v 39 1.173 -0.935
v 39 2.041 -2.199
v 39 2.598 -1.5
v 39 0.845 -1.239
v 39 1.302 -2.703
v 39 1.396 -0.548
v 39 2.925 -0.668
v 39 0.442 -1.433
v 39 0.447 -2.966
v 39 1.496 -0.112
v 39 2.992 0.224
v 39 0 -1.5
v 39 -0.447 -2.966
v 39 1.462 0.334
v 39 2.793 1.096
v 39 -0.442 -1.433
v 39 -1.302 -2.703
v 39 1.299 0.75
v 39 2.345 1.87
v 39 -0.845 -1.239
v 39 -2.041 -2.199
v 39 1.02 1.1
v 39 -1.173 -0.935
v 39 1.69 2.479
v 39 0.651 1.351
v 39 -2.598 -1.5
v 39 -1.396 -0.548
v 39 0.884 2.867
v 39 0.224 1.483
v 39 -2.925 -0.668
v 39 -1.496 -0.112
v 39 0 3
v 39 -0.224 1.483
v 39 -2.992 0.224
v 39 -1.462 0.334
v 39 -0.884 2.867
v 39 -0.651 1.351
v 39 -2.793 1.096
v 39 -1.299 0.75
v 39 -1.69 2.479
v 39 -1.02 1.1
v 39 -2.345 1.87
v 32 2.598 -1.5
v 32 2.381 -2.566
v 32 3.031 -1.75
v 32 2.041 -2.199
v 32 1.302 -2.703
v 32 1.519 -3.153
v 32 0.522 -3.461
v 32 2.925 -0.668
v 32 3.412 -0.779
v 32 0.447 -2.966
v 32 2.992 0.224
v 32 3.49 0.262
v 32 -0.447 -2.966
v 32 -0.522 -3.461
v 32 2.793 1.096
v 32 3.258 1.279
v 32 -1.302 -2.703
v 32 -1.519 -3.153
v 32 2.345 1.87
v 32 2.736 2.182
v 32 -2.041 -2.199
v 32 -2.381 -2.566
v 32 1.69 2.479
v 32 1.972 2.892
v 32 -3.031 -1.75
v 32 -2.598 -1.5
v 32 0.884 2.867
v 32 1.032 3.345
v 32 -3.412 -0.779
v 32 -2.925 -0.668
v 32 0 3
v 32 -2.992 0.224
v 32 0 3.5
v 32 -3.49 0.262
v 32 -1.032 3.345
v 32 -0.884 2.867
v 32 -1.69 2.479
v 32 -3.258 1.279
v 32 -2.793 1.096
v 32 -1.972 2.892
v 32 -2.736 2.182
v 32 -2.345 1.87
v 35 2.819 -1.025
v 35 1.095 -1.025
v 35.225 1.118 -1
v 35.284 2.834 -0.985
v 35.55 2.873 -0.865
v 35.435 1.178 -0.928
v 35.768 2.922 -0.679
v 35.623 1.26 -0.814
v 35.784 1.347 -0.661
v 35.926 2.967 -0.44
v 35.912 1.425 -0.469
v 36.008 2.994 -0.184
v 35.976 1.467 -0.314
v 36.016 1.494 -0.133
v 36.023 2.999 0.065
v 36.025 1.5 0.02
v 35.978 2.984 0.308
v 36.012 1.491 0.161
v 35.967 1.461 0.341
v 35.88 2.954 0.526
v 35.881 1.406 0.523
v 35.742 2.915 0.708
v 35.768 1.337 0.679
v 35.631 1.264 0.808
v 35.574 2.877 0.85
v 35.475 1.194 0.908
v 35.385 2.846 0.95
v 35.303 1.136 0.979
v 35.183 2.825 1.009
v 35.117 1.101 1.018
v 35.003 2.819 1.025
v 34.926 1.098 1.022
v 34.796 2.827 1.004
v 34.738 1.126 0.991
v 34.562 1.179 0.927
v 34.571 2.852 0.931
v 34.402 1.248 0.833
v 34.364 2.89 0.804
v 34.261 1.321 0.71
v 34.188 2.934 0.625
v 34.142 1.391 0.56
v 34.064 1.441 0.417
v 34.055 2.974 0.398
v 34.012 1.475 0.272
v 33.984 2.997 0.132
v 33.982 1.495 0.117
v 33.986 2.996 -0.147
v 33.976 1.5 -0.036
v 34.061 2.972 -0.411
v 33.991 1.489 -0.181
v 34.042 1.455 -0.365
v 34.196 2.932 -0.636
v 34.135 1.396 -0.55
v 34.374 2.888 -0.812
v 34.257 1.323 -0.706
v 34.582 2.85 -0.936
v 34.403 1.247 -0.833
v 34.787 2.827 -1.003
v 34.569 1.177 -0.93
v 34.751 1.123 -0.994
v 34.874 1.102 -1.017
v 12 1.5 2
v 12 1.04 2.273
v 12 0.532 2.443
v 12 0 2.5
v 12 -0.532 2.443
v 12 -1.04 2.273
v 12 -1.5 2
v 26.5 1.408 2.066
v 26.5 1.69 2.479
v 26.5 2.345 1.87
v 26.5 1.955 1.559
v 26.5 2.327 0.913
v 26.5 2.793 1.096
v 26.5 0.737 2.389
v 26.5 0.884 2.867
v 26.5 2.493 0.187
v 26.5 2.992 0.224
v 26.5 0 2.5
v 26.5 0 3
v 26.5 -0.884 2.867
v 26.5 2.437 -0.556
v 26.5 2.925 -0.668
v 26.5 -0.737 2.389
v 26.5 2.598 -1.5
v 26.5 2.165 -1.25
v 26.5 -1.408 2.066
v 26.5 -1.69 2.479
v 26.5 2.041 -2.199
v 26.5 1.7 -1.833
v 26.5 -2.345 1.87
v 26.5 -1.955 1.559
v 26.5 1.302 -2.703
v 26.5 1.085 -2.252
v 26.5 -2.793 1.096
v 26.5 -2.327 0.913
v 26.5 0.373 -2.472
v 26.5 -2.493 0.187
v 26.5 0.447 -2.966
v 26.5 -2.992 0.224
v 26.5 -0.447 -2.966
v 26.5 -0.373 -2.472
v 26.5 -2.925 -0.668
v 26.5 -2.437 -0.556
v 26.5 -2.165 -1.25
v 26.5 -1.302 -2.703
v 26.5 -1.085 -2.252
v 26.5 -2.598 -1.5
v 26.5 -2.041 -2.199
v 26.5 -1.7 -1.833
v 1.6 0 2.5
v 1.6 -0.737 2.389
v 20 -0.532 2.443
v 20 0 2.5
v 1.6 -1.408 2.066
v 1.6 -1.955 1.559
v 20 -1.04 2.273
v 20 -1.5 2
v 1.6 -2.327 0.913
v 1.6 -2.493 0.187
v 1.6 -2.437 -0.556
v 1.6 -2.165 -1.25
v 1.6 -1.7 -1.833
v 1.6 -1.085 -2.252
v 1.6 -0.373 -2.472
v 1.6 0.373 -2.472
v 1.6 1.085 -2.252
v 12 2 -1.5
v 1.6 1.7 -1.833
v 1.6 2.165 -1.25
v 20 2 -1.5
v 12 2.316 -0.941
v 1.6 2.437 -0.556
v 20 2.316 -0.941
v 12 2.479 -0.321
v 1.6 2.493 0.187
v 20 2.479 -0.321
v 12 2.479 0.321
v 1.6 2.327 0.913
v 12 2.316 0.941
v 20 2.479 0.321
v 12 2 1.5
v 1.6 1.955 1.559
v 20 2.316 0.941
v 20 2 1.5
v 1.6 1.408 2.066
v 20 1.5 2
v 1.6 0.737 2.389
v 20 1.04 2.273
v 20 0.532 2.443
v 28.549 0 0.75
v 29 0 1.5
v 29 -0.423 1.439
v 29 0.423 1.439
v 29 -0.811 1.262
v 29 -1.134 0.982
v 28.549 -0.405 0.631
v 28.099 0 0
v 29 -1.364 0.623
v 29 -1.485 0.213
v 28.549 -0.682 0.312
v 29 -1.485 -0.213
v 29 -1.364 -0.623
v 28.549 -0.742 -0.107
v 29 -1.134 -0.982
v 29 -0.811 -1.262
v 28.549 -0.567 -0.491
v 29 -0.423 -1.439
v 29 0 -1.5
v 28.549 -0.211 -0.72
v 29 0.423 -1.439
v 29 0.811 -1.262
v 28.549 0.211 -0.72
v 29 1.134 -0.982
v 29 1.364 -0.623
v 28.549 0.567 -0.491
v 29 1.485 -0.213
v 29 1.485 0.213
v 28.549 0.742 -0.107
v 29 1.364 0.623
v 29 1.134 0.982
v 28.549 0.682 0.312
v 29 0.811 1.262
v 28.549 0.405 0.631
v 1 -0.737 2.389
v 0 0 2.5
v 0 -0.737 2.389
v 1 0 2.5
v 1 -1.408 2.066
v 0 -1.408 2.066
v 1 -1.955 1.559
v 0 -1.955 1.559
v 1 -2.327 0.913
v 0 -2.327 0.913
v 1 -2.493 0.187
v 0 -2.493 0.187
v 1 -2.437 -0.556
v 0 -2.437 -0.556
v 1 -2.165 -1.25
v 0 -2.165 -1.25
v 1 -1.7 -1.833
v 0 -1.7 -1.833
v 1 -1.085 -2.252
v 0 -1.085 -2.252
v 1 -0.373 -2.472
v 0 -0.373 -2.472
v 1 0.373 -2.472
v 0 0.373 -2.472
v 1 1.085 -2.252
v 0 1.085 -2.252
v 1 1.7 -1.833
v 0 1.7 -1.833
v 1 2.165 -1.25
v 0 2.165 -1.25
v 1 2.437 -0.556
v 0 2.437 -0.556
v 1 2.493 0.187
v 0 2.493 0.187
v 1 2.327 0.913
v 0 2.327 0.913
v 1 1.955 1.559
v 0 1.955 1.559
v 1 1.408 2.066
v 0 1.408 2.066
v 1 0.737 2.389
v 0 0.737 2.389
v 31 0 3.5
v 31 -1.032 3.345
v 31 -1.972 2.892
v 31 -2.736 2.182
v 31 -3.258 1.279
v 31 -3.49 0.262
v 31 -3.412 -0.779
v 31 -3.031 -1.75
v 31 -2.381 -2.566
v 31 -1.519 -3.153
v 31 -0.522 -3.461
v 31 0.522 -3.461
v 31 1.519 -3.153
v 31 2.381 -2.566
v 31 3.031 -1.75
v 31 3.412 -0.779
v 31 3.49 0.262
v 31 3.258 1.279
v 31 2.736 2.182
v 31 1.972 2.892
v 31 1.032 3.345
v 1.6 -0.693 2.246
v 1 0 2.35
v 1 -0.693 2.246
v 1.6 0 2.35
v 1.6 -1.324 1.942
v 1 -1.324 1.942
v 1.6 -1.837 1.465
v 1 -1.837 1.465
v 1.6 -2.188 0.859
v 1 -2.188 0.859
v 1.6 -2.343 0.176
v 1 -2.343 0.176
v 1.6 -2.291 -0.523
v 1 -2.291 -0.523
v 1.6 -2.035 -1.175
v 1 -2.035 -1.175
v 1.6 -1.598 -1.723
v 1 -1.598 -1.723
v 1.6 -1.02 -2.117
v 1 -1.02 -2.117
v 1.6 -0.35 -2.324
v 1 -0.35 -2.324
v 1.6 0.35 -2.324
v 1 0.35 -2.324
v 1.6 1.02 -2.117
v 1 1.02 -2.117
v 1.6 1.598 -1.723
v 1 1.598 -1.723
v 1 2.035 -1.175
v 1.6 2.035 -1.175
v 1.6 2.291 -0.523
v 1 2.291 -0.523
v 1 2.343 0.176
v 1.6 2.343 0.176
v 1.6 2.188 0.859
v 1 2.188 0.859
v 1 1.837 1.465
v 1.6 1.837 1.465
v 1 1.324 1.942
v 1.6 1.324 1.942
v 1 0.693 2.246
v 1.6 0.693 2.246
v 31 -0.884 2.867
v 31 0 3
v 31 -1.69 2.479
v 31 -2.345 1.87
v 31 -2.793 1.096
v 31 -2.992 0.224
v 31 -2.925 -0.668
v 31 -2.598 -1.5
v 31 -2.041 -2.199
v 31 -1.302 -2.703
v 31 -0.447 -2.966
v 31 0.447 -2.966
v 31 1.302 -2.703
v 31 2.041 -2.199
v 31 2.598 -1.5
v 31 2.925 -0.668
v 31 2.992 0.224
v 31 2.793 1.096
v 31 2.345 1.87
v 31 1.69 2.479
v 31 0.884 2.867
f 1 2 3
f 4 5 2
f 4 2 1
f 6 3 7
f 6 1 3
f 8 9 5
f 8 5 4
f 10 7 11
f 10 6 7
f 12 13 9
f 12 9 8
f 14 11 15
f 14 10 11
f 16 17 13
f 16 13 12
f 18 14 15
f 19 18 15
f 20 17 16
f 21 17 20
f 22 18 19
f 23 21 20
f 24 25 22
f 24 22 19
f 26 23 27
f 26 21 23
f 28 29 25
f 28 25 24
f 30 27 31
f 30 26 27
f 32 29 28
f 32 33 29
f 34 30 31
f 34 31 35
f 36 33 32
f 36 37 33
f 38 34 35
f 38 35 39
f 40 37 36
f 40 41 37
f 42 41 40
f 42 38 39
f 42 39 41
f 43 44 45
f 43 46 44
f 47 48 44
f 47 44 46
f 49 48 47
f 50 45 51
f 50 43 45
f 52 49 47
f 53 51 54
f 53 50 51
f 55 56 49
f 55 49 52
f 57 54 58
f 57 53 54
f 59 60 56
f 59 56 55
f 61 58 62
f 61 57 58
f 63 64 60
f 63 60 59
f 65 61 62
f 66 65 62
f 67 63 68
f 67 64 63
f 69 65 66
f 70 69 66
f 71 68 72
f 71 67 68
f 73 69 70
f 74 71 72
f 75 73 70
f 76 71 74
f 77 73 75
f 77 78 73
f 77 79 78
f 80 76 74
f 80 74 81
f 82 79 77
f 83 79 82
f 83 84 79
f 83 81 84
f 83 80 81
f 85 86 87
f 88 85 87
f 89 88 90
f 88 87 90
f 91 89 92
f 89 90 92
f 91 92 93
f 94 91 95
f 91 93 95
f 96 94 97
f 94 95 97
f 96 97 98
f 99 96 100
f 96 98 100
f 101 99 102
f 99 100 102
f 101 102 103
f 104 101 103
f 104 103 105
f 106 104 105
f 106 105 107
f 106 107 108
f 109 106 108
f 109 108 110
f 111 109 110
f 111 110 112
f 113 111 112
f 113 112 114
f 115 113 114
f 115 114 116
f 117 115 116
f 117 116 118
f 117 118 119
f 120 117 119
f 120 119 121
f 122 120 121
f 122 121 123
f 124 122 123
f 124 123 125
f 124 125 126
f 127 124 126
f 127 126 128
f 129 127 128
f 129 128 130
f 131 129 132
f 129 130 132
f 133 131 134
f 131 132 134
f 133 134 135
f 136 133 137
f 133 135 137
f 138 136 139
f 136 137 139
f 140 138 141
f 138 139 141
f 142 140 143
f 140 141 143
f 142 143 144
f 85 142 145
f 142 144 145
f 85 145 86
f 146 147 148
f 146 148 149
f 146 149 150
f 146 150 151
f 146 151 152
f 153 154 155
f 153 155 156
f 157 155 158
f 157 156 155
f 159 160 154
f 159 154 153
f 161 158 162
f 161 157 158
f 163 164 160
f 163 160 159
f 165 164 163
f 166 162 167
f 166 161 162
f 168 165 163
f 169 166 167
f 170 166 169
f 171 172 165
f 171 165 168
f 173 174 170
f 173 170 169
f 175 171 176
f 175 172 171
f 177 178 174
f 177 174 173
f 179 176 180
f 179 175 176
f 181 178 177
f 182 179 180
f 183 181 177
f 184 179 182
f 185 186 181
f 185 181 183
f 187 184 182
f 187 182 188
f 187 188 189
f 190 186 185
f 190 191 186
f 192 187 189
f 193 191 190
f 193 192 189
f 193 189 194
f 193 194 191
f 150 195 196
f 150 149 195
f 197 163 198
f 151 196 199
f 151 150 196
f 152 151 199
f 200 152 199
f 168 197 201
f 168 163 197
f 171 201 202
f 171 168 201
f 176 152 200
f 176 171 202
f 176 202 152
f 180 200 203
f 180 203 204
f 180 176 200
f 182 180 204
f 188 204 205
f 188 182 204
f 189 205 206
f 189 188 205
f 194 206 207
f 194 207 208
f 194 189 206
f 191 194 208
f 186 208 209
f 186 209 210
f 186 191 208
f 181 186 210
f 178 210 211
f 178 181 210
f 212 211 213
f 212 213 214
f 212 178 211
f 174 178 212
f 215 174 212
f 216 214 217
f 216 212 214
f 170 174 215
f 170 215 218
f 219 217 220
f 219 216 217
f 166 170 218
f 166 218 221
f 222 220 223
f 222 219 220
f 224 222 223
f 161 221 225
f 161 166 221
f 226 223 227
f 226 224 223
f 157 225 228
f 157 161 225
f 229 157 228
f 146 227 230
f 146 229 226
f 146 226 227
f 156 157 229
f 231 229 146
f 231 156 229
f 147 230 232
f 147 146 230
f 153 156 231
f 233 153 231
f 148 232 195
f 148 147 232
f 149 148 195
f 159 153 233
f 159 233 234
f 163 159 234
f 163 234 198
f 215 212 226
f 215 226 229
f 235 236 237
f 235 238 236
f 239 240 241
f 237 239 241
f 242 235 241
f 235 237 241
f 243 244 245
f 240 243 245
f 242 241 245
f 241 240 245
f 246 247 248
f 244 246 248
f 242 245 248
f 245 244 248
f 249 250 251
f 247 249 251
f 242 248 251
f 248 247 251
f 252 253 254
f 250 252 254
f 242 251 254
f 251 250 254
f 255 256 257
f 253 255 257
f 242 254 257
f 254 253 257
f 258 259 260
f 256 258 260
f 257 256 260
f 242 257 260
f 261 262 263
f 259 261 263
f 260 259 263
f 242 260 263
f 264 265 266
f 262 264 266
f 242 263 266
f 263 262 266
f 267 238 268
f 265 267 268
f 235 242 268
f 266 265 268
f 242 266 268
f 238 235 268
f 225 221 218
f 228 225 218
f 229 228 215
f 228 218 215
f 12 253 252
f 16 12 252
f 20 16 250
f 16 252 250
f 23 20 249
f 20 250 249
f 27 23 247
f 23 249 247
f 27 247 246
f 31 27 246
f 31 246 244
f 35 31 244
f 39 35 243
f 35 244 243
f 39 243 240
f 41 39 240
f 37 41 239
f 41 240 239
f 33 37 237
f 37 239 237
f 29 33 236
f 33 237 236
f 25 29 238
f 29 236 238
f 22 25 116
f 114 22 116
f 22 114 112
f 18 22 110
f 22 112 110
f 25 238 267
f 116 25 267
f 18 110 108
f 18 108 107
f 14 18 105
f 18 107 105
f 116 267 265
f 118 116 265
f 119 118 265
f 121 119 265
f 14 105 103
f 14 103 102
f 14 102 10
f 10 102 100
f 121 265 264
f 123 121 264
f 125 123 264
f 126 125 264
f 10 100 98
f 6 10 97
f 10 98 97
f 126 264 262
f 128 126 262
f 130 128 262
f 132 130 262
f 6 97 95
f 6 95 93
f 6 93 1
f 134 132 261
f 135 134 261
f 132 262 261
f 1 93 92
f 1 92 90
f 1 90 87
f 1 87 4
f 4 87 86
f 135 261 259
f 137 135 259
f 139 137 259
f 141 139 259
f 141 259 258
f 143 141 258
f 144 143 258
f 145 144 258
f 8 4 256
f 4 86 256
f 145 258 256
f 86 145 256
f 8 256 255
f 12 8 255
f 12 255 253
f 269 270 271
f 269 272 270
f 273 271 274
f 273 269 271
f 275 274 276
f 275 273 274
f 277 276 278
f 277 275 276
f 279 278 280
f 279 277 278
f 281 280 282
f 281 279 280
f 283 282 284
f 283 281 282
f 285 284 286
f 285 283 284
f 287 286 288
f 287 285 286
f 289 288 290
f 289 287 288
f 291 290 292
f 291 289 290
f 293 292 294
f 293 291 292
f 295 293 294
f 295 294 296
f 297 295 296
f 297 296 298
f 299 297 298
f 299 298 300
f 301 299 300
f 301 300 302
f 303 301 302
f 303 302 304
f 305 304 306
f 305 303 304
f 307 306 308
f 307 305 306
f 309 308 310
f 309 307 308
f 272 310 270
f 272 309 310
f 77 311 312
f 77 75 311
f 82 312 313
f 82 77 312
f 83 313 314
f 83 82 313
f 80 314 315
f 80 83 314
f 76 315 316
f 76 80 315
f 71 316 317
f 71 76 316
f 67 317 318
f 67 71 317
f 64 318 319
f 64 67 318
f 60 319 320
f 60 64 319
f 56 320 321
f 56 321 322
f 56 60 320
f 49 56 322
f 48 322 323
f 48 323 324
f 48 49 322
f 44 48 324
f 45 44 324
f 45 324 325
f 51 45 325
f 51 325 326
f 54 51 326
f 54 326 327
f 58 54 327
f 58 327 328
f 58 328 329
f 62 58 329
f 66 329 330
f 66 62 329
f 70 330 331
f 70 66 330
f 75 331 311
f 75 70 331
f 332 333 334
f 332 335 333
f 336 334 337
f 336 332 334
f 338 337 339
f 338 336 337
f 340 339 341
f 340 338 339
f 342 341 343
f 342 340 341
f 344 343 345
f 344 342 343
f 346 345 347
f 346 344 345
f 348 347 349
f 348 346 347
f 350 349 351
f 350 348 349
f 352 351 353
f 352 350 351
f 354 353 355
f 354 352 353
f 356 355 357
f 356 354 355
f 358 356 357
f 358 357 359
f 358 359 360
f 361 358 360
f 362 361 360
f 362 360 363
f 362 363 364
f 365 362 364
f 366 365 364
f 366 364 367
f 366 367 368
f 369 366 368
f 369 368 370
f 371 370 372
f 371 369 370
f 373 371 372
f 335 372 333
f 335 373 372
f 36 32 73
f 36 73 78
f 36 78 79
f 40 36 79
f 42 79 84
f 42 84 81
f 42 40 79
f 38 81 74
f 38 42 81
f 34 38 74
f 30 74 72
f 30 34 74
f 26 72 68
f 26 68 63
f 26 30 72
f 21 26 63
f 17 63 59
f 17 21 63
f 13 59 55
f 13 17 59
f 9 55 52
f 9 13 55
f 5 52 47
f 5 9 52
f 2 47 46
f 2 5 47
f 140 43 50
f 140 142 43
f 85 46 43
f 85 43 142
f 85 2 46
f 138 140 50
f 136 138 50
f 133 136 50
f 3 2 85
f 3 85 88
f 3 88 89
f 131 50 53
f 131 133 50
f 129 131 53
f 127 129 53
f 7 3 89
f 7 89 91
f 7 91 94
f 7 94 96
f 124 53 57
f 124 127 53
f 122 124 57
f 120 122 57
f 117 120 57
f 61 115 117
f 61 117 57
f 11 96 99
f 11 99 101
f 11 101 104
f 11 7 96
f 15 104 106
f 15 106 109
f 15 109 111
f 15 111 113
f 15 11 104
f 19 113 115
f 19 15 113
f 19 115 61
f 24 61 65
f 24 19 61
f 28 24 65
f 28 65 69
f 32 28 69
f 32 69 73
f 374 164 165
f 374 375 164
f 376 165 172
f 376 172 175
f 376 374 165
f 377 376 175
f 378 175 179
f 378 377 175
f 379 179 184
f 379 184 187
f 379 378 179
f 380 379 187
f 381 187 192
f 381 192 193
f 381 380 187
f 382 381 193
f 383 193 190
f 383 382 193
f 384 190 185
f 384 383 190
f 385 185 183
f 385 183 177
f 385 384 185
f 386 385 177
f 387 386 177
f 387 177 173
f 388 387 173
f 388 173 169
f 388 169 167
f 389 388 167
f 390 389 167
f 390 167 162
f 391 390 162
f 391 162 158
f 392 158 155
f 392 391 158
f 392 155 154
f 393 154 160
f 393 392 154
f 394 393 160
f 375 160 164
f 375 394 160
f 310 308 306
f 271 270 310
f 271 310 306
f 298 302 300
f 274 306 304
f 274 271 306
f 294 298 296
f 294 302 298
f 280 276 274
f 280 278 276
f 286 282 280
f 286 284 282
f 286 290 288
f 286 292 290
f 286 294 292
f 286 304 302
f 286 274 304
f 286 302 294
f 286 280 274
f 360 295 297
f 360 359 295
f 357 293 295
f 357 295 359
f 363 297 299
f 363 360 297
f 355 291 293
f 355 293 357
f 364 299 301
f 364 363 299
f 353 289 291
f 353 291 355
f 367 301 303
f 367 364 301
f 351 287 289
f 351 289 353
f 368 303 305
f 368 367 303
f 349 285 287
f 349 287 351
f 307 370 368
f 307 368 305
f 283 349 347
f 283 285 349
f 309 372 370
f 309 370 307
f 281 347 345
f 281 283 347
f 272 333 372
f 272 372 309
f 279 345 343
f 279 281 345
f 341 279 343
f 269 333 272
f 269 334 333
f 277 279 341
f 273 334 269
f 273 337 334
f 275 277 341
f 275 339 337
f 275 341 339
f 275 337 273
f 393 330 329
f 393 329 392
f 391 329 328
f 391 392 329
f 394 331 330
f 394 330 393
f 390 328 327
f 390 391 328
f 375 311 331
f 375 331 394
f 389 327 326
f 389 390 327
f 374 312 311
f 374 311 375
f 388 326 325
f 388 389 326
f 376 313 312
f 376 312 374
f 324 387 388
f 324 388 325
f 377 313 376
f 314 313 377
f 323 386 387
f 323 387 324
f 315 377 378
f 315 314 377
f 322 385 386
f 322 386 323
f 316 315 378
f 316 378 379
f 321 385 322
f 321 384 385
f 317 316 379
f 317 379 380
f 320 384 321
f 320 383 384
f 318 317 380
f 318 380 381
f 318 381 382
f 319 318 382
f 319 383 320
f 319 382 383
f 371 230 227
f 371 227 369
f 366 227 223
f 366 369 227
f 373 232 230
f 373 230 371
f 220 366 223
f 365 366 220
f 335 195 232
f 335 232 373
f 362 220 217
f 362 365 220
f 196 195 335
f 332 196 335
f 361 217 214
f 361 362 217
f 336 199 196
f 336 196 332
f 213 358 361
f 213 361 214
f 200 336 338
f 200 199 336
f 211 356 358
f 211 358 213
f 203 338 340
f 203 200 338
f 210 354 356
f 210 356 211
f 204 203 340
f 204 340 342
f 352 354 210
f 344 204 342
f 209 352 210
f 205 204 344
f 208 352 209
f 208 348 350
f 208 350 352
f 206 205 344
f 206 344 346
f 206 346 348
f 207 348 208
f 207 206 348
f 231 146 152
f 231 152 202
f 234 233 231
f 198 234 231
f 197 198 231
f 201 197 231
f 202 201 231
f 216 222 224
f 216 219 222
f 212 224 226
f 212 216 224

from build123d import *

# Parameters (mm, degrees)
SKETCH_2_W               = 8
SKETCH_2_H               = 5
CUT_EXTRUDE_1_DEPTH      = 0.5
SKETCH_3_W               = 8
SKETCH_3_H               = 5
CUT_EXTRUDE_2_DEPTH      = 0.5
MM_1_D                   = 3
MM_1_DEPTH               = 10
MM_1_TIP                 = 0.901290929
HOLE_WIZARD_M2_5_1_D     = 2.05
HOLE_WIZARD_M2_5_1_DEPTH = 3
HOLE_WIZARD_M2_5_1_TIP   = 0.615882135


with BuildPart() as part:
    # 草图1 → 旋转1 (revolve)
    with BuildSketch(Plane.XY, mode=Mode.PRIVATE) as revolve_1_sk:
        Polygon((0, 0), (0, 2.5), (1, 2.5), (1, 2.35), (1.6, 2.35), (1.6, 2.5), (26.5, 2.5), (26.5, 3), (31, 3), (31, 3.5), (32, 3.5), (32, 3), (39, 3), (39, 0), align=None)
    revolve(revolve_1_sk.sketch.rotate(Axis((0, 0, 0), (1, 0, 0)), 90), axis=Axis((0, 0, 0), (1, 0, 0)))

    # 草图2 → 切除-拉伸1 (cut)
    with BuildSketch(Plane.XY.offset(2.5)):
        with Locations((16, 0)):
            Rectangle(SKETCH_2_W, SKETCH_2_H)
    extrude(amount=-CUT_EXTRUDE_1_DEPTH, mode=Mode.SUBTRACT)

    # 草图3 → 切除-拉伸2 (cut)
    with BuildSketch(Plane(origin=(0, 2.5, 0), x_dir=(1, 0, 0), z_dir=(0, 1, 0))):
        with Locations((16, 0)):
            Rectangle(SKETCH_3_W, SKETCH_3_H)
    extrude(amount=-CUT_EXTRUDE_2_DEPTH, mode=Mode.SUBTRACT)

    # 大小mm 暗销孔1
    with Locations(Plane(origin=(39, 0, 0), x_dir=(0, 0, 1), z_dir=(1, 0, 0))):
        with Locations((0, 0)):
            Hole(MM_1_D / 2, depth=MM_1_DEPTH)
            with Locations((0, 0, -(MM_1_DEPTH + MM_1_TIP / 2))):  # 118° drill point
                Cone(0, MM_1_D / 2, MM_1_TIP, mode=Mode.SUBTRACT)

    # M2.5 螺纹孔1
    with Locations(Plane(origin=(35, 3, 0), x_dir=(0, 0, 1), z_dir=(0, 1, 0))):
        with Locations((0, 0)):
            Hole(HOLE_WIZARD_M2_5_1_D / 2, depth=HOLE_WIZARD_M2_5_1_DEPTH)
            with Locations((0, 0, -(HOLE_WIZARD_M2_5_1_DEPTH + HOLE_WIZARD_M2_5_1_TIP / 2))):  # 118° drill point
                Cone(0, HOLE_WIZARD_M2_5_1_D / 2, HOLE_WIZARD_M2_5_1_TIP, mode=Mode.SUBTRACT)


solid = part.part
